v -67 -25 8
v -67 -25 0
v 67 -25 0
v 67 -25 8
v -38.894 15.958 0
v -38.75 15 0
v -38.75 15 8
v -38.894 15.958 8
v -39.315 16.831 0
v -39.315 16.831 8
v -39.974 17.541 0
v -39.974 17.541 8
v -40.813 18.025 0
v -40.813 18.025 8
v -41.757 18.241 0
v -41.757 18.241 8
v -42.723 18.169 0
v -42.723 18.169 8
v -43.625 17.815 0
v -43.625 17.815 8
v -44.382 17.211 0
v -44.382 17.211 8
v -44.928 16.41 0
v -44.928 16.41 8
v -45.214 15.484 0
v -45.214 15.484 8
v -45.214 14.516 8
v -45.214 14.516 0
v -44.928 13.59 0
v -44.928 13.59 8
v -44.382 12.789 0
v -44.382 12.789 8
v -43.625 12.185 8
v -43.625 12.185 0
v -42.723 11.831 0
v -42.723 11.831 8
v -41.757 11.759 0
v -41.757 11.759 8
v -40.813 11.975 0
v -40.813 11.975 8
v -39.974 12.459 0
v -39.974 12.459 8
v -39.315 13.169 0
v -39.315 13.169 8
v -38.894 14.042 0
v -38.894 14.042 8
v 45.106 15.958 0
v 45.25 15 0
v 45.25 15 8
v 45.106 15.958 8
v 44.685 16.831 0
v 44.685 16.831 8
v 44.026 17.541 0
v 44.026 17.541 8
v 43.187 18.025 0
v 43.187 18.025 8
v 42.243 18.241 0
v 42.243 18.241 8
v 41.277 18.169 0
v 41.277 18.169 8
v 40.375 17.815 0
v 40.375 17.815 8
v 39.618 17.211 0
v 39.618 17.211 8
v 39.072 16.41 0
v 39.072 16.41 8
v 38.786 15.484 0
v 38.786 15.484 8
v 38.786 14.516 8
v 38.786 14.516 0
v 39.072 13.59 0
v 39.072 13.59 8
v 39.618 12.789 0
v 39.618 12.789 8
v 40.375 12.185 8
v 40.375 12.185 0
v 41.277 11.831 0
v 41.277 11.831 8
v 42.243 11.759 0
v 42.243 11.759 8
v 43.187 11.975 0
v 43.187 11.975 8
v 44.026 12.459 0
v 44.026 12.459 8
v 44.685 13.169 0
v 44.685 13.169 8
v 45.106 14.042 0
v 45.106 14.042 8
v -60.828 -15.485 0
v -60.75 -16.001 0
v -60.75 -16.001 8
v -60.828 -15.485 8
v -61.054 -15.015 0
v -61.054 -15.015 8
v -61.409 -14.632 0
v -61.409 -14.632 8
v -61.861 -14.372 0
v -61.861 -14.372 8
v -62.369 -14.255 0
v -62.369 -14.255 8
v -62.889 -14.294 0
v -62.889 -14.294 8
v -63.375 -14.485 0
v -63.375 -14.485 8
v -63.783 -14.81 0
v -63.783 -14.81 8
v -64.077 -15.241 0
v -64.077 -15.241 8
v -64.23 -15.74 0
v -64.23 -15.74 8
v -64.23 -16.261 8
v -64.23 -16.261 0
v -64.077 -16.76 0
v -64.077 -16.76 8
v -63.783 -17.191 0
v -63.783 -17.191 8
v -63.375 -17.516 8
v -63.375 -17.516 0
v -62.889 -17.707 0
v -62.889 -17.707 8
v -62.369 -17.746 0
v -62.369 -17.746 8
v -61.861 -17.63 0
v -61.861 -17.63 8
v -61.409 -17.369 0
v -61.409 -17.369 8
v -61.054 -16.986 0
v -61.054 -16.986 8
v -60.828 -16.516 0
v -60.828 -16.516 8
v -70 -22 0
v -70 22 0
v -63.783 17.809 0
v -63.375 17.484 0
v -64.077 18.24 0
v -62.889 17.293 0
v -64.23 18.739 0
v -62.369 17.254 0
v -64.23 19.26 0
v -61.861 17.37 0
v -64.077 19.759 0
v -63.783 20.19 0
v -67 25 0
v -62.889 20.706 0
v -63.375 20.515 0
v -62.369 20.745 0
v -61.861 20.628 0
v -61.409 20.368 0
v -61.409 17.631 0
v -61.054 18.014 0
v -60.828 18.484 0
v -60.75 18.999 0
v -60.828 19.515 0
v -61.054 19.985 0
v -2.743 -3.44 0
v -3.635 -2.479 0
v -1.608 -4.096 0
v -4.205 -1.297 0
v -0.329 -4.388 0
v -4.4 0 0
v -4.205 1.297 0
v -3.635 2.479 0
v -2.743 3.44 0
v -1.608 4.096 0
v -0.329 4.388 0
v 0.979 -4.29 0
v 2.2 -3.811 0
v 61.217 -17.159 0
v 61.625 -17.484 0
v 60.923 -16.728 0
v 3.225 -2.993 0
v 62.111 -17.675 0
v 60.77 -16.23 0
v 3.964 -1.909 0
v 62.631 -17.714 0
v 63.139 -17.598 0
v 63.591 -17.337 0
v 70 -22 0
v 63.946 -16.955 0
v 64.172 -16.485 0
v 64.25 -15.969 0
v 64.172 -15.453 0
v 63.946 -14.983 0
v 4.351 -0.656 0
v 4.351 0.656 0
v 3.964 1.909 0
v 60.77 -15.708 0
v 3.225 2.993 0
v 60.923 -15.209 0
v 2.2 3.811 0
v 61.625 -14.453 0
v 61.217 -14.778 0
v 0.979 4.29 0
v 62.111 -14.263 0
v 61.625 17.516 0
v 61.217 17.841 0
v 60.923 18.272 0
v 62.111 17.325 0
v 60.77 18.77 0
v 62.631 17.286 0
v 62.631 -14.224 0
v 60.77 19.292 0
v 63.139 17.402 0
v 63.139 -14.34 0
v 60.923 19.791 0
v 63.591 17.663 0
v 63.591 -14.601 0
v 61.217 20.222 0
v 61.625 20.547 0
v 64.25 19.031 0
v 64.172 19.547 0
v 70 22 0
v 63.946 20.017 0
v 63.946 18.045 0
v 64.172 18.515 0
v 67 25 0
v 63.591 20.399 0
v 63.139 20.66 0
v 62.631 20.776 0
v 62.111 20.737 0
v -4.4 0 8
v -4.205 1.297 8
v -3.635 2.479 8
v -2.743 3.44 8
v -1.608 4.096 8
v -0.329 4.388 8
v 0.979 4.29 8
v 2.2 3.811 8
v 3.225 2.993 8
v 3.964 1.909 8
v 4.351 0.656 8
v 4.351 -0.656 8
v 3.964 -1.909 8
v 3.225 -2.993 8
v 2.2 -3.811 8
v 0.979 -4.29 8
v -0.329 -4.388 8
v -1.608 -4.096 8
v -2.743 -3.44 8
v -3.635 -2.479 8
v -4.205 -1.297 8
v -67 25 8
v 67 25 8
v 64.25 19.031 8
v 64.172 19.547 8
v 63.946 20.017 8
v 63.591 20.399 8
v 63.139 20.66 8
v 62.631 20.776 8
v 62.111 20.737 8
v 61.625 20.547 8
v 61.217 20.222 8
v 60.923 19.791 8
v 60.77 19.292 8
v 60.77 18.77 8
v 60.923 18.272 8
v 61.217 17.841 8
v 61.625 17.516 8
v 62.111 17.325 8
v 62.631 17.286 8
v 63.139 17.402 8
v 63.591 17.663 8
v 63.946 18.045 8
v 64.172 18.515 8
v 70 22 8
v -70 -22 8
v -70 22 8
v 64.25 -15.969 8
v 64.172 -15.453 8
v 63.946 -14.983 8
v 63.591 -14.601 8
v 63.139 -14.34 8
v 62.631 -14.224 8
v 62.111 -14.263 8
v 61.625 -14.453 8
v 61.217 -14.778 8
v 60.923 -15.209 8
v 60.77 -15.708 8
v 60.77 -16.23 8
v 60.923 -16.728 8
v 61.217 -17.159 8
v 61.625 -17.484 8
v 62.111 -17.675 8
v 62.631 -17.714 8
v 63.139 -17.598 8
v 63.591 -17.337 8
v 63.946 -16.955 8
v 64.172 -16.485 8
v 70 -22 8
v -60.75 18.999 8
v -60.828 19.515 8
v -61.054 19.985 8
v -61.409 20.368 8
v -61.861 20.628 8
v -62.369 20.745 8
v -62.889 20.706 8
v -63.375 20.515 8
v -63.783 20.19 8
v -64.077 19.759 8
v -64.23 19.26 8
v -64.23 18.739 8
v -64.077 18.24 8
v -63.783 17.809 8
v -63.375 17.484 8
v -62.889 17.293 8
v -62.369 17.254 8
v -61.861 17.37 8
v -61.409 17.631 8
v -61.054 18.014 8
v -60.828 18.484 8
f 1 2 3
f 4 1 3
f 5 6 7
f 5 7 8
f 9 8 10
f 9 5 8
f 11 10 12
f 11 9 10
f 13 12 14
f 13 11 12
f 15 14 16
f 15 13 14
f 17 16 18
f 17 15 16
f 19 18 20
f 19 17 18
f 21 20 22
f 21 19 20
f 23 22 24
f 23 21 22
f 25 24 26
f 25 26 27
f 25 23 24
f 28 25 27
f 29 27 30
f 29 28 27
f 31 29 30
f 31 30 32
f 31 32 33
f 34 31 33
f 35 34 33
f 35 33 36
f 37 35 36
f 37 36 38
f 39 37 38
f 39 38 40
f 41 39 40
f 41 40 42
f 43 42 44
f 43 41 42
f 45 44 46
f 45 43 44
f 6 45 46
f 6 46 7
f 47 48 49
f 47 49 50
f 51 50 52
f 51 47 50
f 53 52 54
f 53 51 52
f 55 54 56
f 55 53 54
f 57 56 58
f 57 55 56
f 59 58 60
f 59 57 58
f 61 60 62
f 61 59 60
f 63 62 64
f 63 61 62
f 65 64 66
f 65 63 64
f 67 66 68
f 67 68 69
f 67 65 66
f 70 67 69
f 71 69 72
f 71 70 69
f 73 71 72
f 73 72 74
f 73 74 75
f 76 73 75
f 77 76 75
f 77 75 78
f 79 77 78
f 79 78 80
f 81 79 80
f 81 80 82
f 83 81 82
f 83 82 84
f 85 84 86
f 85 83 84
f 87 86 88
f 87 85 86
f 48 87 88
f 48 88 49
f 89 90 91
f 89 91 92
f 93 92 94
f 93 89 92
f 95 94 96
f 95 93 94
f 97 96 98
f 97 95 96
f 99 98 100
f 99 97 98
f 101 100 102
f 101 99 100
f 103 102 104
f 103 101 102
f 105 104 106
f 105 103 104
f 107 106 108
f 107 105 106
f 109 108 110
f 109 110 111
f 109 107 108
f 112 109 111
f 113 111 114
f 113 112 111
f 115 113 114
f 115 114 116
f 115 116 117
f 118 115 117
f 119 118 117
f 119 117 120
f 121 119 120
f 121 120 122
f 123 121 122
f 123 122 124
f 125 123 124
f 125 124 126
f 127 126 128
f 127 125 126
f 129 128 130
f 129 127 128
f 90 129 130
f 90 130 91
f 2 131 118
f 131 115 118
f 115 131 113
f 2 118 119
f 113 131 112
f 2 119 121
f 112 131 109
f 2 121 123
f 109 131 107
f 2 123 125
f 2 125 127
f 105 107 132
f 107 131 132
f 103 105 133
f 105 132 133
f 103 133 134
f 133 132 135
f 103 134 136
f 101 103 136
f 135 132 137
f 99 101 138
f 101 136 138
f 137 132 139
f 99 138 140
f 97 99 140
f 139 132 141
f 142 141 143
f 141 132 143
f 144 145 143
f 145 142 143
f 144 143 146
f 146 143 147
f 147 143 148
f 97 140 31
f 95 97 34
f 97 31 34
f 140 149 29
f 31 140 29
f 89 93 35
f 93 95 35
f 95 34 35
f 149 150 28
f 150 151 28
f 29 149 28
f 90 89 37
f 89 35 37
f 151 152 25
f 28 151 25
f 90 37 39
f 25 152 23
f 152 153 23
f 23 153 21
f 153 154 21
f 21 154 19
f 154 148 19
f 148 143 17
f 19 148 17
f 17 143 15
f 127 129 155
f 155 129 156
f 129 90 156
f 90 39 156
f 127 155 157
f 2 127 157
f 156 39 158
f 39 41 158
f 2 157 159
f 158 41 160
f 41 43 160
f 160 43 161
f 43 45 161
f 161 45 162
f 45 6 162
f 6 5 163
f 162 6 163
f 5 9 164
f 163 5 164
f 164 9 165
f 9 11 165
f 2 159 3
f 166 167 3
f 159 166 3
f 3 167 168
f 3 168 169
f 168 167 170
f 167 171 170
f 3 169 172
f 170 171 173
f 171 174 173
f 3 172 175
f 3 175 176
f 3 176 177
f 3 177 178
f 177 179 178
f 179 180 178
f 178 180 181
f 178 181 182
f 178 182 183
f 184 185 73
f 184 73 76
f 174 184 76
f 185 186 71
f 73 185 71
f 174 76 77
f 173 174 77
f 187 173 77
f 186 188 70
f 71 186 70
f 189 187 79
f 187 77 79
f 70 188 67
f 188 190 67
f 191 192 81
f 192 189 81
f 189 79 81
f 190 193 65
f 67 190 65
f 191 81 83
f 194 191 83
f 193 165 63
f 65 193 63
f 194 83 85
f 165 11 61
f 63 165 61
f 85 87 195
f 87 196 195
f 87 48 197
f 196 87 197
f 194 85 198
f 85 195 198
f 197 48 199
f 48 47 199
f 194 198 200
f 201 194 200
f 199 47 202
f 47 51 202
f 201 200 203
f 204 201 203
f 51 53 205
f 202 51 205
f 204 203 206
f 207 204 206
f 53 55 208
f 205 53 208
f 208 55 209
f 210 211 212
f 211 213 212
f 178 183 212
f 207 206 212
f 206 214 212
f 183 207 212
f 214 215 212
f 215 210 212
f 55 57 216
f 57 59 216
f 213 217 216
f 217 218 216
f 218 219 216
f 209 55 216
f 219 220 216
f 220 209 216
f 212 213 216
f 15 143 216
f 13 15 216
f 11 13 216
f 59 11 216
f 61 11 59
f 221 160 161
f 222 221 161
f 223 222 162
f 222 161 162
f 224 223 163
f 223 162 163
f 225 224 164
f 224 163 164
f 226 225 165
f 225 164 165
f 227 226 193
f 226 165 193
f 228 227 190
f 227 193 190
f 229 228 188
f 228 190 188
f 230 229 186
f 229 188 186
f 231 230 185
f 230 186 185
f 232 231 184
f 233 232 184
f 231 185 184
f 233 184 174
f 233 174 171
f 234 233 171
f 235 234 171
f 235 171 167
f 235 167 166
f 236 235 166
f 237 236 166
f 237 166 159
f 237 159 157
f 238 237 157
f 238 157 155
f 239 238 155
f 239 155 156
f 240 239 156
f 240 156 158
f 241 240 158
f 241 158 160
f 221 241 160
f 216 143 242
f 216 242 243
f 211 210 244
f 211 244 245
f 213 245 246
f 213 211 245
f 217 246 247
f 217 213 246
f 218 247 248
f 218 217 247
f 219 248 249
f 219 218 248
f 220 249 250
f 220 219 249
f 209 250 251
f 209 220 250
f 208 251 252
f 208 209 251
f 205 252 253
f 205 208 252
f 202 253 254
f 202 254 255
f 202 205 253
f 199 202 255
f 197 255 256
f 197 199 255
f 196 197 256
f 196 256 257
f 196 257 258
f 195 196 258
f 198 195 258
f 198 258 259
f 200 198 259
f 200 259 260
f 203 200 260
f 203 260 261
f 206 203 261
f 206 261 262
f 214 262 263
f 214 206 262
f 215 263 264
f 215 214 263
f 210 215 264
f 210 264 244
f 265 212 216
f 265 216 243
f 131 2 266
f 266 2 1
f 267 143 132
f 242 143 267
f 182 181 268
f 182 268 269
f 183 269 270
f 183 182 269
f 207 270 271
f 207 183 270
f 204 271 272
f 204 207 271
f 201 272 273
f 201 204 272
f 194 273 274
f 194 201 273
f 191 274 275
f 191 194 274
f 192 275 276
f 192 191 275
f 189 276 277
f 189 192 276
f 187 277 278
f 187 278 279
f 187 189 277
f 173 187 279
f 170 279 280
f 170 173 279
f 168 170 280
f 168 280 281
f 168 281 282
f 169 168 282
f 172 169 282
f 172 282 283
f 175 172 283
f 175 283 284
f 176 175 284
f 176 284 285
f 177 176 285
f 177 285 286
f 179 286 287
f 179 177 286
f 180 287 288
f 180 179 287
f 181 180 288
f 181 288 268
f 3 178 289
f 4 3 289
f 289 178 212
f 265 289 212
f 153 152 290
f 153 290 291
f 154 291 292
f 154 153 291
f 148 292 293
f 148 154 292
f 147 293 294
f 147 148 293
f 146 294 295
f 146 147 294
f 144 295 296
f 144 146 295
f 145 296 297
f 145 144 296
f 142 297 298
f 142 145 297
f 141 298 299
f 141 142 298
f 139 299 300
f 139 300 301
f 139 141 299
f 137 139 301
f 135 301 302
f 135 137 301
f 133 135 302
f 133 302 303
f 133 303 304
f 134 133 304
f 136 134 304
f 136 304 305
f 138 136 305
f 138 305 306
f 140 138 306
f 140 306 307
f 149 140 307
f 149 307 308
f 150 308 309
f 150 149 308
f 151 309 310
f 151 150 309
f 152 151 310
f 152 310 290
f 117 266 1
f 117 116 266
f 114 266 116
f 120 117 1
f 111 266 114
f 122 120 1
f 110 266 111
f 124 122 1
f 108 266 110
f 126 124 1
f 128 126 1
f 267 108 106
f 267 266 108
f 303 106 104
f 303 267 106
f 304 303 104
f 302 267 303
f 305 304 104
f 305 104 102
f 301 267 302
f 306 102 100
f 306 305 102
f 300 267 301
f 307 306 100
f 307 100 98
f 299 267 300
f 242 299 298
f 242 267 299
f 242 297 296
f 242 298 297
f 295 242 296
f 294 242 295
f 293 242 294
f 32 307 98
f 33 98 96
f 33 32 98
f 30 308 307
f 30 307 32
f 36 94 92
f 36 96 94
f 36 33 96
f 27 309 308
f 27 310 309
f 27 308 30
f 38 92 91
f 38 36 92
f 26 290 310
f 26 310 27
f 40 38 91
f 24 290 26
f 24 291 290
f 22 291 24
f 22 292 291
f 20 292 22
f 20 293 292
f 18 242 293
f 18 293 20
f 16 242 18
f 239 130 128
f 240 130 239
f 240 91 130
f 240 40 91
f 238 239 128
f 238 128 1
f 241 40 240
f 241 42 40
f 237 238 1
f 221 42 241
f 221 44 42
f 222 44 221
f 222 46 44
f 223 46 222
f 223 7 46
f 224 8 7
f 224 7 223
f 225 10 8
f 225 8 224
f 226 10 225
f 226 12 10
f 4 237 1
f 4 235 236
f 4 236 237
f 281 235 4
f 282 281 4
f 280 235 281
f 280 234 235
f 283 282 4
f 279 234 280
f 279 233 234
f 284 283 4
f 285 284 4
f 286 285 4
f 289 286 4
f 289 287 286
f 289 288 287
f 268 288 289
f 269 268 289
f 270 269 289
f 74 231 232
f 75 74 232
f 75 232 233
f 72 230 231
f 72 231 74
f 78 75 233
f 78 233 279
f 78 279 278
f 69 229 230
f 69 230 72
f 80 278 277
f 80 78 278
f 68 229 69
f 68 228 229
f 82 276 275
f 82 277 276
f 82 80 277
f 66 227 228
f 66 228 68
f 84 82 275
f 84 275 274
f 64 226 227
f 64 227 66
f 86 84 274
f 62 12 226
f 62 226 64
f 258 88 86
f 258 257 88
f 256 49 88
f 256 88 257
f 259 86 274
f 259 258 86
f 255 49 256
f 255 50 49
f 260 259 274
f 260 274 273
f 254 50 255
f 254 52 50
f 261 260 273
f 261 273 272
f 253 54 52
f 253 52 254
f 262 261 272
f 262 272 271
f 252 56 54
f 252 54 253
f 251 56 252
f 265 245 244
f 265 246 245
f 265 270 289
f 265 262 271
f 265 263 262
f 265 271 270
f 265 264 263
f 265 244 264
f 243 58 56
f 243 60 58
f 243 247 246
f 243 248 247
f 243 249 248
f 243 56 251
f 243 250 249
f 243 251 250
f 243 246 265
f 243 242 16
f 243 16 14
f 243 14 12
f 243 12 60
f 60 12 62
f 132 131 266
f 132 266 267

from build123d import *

# Parameters (mm, degrees)
F0_W     = 140
F0_H     = 50
F0_R     = 1.75
F0_R_2   = 3.25
F0_R_3   = 2.5
F1_DEPTH = 8
F2_SIZE  = 3
F4_D     = 8.8


with BuildPart() as f1:
    # F0 (on Top) → F1 (new body)
    with BuildSketch(Plane.XY):
        Rectangle(F0_W, F0_H)
        with Locations((-62.4999959502, -16.0005345571)):
            Circle(F0_R, mode=Mode.SUBTRACT)
        with Locations((62.5, -15.968715623)):
            Circle(F0_R, mode=Mode.SUBTRACT)
        with Locations((-42, 15)):
            Circle(F0_R_2, mode=Mode.SUBTRACT)
        with Locations((-62.4999959502, 18.9994654429)):
            Circle(F0_R, mode=Mode.SUBTRACT)
        Circle(F0_R_3, mode=Mode.SUBTRACT)
        with Locations((42, 15)):
            Circle(F0_R_2, mode=Mode.SUBTRACT)
        with Locations((62.5, 19.031284377)):
            Circle(F0_R, mode=Mode.SUBTRACT)
    extrude(amount=F1_DEPTH)

    # F2
    f2_edges = [f1.edges().sort_by_distance(p)[0] for p in [
        (-70, -25, 4),
        (70, -25, 4),
        (70, 25, 4),
        (-70, 25, 4),
    ]]
    chamfer(f2_edges, length=F2_SIZE)

    # F4 (through all)
    with Locations(Plane.XY.offset(8)):
        with Locations((0, 0)):
            Hole(F4_D / 2)


solid = f1.part
